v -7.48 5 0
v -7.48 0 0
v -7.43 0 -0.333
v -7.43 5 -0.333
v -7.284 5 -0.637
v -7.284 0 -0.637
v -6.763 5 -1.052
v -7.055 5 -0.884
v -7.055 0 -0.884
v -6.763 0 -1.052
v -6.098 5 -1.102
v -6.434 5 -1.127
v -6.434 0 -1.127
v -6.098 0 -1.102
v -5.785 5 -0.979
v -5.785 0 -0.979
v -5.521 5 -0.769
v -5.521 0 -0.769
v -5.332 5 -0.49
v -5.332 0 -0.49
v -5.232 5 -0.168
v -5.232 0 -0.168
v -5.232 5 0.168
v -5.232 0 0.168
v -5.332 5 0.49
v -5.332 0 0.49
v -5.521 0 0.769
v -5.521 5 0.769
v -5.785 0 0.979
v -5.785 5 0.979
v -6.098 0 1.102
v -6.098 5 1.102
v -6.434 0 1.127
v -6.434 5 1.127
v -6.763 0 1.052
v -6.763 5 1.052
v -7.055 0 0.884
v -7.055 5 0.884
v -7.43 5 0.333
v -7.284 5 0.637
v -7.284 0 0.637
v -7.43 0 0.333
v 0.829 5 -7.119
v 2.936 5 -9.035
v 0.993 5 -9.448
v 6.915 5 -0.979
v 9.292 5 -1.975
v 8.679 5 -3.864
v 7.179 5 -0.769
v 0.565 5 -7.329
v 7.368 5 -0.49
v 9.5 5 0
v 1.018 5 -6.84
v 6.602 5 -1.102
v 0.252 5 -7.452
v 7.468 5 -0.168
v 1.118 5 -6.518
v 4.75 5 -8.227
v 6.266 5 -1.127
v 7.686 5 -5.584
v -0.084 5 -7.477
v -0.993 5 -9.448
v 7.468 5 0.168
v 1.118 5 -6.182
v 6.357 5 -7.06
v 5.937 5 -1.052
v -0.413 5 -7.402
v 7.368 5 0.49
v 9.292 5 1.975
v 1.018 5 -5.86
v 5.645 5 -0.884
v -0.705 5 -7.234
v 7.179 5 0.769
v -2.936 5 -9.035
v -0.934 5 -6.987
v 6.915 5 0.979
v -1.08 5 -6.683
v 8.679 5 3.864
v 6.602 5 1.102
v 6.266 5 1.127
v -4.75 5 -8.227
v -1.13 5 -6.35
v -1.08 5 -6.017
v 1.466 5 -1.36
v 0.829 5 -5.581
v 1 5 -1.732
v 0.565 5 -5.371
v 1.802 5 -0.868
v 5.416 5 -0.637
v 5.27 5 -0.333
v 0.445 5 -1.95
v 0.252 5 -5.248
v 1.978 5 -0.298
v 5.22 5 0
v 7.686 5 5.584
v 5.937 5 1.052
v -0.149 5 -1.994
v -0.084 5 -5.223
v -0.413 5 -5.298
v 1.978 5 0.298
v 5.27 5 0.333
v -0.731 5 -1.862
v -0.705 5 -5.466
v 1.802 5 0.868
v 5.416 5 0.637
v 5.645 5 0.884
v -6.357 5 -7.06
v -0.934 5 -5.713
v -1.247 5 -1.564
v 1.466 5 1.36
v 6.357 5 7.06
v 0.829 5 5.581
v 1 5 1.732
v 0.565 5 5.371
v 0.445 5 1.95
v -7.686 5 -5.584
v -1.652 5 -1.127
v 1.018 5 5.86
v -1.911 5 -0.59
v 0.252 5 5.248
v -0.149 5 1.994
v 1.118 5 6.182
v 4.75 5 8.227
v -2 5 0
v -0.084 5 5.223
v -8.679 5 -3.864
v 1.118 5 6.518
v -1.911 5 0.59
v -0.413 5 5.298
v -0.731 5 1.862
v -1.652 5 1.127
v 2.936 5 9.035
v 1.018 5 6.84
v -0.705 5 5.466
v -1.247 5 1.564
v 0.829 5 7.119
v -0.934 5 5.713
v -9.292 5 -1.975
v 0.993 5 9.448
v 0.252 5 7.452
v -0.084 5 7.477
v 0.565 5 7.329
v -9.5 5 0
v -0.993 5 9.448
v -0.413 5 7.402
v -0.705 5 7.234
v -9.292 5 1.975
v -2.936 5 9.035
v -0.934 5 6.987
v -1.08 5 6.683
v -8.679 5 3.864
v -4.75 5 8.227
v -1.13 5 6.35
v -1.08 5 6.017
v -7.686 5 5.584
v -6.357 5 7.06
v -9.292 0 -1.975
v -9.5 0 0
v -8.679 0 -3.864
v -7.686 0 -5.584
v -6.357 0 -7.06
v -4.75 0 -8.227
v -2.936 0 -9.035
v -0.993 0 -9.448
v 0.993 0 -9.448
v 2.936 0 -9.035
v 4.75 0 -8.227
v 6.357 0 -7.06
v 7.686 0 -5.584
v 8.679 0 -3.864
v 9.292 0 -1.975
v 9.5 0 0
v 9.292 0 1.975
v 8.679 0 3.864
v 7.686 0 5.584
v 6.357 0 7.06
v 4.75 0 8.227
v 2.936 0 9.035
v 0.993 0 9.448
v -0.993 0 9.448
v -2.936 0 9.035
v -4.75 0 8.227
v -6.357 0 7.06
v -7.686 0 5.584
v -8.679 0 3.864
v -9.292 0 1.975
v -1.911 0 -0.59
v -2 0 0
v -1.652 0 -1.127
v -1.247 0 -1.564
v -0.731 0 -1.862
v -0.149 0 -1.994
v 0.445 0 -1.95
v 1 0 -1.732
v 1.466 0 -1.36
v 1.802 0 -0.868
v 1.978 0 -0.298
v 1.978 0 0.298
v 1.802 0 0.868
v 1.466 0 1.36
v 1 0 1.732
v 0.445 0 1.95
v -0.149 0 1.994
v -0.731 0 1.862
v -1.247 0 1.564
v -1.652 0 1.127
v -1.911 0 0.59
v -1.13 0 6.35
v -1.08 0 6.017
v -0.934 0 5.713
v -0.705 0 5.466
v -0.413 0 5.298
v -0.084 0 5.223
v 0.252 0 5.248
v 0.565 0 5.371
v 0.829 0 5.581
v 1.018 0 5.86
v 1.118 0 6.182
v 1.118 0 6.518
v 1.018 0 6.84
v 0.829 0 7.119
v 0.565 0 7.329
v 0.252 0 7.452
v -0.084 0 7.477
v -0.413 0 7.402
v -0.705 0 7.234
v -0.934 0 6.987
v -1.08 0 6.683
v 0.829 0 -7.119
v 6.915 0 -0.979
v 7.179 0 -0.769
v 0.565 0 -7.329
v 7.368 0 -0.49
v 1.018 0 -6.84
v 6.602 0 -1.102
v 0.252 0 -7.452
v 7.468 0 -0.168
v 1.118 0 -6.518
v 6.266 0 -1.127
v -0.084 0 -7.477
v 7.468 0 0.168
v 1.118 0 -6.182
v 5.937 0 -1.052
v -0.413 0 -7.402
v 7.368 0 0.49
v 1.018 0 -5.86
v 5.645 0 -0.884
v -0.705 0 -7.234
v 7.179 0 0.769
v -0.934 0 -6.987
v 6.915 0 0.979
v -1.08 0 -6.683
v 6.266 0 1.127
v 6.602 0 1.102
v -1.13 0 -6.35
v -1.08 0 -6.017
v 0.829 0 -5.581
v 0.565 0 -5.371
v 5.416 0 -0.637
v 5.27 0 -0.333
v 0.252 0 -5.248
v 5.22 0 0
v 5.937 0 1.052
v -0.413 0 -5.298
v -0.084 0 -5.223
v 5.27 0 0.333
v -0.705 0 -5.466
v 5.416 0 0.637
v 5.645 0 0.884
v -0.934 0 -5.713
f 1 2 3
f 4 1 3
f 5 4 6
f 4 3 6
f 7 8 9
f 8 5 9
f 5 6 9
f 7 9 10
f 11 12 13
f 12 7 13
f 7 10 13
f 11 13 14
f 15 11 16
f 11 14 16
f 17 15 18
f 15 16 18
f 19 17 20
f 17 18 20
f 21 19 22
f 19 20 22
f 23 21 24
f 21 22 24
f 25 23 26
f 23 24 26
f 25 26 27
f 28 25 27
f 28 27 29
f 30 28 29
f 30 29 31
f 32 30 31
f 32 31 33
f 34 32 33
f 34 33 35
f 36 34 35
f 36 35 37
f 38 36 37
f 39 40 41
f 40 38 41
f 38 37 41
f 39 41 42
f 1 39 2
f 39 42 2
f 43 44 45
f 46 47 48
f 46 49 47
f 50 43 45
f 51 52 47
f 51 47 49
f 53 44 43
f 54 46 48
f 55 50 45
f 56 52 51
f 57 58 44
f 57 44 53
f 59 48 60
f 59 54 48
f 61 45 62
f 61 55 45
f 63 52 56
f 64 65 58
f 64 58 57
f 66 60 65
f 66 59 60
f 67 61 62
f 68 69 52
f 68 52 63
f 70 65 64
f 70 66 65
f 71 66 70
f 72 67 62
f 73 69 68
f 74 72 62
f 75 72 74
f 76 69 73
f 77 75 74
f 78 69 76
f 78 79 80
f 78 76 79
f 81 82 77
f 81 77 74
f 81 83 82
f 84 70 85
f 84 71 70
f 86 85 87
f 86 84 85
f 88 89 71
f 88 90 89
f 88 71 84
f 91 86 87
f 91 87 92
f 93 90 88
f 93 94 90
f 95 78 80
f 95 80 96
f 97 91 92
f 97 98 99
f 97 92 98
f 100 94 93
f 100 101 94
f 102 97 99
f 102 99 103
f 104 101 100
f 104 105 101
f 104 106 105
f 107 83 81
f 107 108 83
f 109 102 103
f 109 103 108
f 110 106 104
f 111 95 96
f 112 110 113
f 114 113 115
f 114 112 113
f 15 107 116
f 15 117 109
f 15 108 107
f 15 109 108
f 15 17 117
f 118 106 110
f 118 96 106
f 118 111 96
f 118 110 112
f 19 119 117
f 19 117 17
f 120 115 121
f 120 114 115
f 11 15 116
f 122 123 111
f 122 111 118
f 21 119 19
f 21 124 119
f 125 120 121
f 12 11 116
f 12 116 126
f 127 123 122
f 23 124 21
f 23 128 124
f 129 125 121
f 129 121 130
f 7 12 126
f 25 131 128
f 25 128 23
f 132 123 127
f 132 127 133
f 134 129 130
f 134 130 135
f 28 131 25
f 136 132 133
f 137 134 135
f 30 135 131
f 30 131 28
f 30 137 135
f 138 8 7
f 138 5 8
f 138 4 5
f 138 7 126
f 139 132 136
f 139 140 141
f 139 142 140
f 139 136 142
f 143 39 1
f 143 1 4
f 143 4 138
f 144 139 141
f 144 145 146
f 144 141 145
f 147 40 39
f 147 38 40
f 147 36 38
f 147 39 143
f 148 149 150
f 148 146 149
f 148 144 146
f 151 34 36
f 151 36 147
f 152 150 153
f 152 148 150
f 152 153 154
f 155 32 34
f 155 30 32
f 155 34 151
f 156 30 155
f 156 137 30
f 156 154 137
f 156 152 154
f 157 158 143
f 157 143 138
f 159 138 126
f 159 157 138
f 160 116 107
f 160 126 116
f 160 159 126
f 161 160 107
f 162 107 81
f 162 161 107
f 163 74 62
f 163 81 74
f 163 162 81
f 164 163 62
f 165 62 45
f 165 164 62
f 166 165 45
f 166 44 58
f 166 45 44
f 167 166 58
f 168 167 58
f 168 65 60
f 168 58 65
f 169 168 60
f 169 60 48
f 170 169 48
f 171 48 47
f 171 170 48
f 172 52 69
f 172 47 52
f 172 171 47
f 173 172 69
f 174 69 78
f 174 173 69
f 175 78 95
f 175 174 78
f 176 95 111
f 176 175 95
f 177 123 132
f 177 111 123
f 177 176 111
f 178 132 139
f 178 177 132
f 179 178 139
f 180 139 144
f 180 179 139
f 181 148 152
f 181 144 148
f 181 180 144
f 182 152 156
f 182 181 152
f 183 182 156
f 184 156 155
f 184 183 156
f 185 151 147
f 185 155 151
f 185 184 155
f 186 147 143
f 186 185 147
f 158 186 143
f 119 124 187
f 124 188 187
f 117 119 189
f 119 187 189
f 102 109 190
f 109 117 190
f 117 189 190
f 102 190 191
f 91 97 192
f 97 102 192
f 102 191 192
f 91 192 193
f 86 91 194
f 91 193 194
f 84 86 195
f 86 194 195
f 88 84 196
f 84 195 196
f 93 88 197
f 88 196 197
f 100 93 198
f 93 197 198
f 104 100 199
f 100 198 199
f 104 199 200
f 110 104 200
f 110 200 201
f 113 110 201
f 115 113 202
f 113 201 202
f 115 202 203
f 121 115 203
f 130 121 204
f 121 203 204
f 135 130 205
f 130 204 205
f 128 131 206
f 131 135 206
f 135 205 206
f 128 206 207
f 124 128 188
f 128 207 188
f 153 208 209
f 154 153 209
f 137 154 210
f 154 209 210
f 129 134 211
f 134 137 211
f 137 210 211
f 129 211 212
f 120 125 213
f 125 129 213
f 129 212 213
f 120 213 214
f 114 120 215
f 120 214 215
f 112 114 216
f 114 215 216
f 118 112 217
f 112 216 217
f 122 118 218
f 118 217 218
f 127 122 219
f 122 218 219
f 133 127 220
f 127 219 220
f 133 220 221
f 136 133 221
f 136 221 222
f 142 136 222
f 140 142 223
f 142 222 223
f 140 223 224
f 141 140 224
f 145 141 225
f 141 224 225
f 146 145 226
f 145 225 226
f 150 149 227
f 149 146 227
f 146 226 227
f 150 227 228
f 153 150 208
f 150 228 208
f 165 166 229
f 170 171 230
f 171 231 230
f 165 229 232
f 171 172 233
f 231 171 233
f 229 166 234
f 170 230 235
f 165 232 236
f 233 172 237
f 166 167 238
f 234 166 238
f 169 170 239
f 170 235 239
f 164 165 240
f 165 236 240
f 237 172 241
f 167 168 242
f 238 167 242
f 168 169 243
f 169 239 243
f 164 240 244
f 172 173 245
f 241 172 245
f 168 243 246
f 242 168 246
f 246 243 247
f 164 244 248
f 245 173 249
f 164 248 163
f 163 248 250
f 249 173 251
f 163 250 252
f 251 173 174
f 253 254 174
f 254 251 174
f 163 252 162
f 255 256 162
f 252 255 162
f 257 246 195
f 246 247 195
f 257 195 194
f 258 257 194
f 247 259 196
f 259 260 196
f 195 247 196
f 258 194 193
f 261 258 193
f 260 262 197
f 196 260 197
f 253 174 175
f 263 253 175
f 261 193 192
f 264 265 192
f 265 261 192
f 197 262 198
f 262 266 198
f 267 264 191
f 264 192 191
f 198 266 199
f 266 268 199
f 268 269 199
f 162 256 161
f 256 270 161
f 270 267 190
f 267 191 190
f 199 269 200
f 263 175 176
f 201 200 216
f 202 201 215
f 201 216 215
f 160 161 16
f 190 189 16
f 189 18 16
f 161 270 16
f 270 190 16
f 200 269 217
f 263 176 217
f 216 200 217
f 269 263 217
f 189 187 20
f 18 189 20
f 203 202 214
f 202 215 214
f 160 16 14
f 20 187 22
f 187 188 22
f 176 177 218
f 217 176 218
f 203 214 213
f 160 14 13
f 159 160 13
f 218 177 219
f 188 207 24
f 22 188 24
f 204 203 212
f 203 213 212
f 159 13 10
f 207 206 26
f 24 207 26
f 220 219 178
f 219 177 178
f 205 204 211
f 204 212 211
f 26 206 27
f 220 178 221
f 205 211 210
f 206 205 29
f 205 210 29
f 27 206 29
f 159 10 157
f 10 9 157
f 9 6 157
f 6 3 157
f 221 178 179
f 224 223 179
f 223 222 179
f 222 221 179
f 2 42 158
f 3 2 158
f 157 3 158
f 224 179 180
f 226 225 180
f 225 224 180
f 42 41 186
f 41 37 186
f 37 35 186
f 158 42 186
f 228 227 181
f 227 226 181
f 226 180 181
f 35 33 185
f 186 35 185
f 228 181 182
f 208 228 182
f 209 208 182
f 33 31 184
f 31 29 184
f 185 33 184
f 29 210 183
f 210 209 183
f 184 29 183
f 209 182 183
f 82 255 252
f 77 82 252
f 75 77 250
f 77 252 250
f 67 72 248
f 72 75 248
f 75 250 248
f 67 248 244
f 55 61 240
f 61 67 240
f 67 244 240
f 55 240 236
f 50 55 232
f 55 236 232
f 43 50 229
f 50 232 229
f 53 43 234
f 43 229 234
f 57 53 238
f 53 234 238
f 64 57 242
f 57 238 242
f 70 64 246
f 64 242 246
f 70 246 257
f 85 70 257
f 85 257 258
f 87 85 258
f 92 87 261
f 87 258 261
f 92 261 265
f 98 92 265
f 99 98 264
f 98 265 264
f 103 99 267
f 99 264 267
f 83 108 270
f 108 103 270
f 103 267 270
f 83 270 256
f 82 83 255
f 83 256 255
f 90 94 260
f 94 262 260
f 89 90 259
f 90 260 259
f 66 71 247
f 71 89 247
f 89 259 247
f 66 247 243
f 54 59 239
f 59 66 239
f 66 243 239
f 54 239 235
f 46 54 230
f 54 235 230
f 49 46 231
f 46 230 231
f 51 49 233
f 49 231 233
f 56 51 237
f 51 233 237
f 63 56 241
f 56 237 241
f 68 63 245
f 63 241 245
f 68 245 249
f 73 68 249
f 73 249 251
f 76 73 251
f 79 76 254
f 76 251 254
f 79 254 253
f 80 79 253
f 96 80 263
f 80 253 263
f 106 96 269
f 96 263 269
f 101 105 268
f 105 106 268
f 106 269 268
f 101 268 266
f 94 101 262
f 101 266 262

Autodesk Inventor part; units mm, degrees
ref_plane "YZ Plane" through (0, 0, 0) normal (1, 0, 0) x (0, 1, 0)
ref_plane "XZ Plane" through (0, 0, 0) normal (0, 1, 0) x (-1, 0, 0)
ref_plane "XY Plane" through (0, 0, 0) normal (0, 0, 1) x (1, 0, 0)
sketch "Sketch1" plane through (0, 0, 0) normal (0, 1, 0) x (-1, 0, 0)
  circle A0 centre (0, 0) radius 9.5
  circle A1 centre (0, 0) radius 2
  circle A2 centre (-6.35, 0) radius 1.1303
  circle A3 centre (0, -6.35) radius 1.1303
  circle A4 centre (6.35, 0) radius 1.1303
  circle A5 centre (0, 6.35) radius 1.1303
  dimension "d0" = 19
  dimension "d1" = 4
  dimension "d2" = 6.35
  dimension "d3" = 2.2606
  dimension "d6" = 360
extrude "Extrusion1" add sketch "Sketch1" along normal blind 5
properties part number "Motor_Hub_Polulu"
